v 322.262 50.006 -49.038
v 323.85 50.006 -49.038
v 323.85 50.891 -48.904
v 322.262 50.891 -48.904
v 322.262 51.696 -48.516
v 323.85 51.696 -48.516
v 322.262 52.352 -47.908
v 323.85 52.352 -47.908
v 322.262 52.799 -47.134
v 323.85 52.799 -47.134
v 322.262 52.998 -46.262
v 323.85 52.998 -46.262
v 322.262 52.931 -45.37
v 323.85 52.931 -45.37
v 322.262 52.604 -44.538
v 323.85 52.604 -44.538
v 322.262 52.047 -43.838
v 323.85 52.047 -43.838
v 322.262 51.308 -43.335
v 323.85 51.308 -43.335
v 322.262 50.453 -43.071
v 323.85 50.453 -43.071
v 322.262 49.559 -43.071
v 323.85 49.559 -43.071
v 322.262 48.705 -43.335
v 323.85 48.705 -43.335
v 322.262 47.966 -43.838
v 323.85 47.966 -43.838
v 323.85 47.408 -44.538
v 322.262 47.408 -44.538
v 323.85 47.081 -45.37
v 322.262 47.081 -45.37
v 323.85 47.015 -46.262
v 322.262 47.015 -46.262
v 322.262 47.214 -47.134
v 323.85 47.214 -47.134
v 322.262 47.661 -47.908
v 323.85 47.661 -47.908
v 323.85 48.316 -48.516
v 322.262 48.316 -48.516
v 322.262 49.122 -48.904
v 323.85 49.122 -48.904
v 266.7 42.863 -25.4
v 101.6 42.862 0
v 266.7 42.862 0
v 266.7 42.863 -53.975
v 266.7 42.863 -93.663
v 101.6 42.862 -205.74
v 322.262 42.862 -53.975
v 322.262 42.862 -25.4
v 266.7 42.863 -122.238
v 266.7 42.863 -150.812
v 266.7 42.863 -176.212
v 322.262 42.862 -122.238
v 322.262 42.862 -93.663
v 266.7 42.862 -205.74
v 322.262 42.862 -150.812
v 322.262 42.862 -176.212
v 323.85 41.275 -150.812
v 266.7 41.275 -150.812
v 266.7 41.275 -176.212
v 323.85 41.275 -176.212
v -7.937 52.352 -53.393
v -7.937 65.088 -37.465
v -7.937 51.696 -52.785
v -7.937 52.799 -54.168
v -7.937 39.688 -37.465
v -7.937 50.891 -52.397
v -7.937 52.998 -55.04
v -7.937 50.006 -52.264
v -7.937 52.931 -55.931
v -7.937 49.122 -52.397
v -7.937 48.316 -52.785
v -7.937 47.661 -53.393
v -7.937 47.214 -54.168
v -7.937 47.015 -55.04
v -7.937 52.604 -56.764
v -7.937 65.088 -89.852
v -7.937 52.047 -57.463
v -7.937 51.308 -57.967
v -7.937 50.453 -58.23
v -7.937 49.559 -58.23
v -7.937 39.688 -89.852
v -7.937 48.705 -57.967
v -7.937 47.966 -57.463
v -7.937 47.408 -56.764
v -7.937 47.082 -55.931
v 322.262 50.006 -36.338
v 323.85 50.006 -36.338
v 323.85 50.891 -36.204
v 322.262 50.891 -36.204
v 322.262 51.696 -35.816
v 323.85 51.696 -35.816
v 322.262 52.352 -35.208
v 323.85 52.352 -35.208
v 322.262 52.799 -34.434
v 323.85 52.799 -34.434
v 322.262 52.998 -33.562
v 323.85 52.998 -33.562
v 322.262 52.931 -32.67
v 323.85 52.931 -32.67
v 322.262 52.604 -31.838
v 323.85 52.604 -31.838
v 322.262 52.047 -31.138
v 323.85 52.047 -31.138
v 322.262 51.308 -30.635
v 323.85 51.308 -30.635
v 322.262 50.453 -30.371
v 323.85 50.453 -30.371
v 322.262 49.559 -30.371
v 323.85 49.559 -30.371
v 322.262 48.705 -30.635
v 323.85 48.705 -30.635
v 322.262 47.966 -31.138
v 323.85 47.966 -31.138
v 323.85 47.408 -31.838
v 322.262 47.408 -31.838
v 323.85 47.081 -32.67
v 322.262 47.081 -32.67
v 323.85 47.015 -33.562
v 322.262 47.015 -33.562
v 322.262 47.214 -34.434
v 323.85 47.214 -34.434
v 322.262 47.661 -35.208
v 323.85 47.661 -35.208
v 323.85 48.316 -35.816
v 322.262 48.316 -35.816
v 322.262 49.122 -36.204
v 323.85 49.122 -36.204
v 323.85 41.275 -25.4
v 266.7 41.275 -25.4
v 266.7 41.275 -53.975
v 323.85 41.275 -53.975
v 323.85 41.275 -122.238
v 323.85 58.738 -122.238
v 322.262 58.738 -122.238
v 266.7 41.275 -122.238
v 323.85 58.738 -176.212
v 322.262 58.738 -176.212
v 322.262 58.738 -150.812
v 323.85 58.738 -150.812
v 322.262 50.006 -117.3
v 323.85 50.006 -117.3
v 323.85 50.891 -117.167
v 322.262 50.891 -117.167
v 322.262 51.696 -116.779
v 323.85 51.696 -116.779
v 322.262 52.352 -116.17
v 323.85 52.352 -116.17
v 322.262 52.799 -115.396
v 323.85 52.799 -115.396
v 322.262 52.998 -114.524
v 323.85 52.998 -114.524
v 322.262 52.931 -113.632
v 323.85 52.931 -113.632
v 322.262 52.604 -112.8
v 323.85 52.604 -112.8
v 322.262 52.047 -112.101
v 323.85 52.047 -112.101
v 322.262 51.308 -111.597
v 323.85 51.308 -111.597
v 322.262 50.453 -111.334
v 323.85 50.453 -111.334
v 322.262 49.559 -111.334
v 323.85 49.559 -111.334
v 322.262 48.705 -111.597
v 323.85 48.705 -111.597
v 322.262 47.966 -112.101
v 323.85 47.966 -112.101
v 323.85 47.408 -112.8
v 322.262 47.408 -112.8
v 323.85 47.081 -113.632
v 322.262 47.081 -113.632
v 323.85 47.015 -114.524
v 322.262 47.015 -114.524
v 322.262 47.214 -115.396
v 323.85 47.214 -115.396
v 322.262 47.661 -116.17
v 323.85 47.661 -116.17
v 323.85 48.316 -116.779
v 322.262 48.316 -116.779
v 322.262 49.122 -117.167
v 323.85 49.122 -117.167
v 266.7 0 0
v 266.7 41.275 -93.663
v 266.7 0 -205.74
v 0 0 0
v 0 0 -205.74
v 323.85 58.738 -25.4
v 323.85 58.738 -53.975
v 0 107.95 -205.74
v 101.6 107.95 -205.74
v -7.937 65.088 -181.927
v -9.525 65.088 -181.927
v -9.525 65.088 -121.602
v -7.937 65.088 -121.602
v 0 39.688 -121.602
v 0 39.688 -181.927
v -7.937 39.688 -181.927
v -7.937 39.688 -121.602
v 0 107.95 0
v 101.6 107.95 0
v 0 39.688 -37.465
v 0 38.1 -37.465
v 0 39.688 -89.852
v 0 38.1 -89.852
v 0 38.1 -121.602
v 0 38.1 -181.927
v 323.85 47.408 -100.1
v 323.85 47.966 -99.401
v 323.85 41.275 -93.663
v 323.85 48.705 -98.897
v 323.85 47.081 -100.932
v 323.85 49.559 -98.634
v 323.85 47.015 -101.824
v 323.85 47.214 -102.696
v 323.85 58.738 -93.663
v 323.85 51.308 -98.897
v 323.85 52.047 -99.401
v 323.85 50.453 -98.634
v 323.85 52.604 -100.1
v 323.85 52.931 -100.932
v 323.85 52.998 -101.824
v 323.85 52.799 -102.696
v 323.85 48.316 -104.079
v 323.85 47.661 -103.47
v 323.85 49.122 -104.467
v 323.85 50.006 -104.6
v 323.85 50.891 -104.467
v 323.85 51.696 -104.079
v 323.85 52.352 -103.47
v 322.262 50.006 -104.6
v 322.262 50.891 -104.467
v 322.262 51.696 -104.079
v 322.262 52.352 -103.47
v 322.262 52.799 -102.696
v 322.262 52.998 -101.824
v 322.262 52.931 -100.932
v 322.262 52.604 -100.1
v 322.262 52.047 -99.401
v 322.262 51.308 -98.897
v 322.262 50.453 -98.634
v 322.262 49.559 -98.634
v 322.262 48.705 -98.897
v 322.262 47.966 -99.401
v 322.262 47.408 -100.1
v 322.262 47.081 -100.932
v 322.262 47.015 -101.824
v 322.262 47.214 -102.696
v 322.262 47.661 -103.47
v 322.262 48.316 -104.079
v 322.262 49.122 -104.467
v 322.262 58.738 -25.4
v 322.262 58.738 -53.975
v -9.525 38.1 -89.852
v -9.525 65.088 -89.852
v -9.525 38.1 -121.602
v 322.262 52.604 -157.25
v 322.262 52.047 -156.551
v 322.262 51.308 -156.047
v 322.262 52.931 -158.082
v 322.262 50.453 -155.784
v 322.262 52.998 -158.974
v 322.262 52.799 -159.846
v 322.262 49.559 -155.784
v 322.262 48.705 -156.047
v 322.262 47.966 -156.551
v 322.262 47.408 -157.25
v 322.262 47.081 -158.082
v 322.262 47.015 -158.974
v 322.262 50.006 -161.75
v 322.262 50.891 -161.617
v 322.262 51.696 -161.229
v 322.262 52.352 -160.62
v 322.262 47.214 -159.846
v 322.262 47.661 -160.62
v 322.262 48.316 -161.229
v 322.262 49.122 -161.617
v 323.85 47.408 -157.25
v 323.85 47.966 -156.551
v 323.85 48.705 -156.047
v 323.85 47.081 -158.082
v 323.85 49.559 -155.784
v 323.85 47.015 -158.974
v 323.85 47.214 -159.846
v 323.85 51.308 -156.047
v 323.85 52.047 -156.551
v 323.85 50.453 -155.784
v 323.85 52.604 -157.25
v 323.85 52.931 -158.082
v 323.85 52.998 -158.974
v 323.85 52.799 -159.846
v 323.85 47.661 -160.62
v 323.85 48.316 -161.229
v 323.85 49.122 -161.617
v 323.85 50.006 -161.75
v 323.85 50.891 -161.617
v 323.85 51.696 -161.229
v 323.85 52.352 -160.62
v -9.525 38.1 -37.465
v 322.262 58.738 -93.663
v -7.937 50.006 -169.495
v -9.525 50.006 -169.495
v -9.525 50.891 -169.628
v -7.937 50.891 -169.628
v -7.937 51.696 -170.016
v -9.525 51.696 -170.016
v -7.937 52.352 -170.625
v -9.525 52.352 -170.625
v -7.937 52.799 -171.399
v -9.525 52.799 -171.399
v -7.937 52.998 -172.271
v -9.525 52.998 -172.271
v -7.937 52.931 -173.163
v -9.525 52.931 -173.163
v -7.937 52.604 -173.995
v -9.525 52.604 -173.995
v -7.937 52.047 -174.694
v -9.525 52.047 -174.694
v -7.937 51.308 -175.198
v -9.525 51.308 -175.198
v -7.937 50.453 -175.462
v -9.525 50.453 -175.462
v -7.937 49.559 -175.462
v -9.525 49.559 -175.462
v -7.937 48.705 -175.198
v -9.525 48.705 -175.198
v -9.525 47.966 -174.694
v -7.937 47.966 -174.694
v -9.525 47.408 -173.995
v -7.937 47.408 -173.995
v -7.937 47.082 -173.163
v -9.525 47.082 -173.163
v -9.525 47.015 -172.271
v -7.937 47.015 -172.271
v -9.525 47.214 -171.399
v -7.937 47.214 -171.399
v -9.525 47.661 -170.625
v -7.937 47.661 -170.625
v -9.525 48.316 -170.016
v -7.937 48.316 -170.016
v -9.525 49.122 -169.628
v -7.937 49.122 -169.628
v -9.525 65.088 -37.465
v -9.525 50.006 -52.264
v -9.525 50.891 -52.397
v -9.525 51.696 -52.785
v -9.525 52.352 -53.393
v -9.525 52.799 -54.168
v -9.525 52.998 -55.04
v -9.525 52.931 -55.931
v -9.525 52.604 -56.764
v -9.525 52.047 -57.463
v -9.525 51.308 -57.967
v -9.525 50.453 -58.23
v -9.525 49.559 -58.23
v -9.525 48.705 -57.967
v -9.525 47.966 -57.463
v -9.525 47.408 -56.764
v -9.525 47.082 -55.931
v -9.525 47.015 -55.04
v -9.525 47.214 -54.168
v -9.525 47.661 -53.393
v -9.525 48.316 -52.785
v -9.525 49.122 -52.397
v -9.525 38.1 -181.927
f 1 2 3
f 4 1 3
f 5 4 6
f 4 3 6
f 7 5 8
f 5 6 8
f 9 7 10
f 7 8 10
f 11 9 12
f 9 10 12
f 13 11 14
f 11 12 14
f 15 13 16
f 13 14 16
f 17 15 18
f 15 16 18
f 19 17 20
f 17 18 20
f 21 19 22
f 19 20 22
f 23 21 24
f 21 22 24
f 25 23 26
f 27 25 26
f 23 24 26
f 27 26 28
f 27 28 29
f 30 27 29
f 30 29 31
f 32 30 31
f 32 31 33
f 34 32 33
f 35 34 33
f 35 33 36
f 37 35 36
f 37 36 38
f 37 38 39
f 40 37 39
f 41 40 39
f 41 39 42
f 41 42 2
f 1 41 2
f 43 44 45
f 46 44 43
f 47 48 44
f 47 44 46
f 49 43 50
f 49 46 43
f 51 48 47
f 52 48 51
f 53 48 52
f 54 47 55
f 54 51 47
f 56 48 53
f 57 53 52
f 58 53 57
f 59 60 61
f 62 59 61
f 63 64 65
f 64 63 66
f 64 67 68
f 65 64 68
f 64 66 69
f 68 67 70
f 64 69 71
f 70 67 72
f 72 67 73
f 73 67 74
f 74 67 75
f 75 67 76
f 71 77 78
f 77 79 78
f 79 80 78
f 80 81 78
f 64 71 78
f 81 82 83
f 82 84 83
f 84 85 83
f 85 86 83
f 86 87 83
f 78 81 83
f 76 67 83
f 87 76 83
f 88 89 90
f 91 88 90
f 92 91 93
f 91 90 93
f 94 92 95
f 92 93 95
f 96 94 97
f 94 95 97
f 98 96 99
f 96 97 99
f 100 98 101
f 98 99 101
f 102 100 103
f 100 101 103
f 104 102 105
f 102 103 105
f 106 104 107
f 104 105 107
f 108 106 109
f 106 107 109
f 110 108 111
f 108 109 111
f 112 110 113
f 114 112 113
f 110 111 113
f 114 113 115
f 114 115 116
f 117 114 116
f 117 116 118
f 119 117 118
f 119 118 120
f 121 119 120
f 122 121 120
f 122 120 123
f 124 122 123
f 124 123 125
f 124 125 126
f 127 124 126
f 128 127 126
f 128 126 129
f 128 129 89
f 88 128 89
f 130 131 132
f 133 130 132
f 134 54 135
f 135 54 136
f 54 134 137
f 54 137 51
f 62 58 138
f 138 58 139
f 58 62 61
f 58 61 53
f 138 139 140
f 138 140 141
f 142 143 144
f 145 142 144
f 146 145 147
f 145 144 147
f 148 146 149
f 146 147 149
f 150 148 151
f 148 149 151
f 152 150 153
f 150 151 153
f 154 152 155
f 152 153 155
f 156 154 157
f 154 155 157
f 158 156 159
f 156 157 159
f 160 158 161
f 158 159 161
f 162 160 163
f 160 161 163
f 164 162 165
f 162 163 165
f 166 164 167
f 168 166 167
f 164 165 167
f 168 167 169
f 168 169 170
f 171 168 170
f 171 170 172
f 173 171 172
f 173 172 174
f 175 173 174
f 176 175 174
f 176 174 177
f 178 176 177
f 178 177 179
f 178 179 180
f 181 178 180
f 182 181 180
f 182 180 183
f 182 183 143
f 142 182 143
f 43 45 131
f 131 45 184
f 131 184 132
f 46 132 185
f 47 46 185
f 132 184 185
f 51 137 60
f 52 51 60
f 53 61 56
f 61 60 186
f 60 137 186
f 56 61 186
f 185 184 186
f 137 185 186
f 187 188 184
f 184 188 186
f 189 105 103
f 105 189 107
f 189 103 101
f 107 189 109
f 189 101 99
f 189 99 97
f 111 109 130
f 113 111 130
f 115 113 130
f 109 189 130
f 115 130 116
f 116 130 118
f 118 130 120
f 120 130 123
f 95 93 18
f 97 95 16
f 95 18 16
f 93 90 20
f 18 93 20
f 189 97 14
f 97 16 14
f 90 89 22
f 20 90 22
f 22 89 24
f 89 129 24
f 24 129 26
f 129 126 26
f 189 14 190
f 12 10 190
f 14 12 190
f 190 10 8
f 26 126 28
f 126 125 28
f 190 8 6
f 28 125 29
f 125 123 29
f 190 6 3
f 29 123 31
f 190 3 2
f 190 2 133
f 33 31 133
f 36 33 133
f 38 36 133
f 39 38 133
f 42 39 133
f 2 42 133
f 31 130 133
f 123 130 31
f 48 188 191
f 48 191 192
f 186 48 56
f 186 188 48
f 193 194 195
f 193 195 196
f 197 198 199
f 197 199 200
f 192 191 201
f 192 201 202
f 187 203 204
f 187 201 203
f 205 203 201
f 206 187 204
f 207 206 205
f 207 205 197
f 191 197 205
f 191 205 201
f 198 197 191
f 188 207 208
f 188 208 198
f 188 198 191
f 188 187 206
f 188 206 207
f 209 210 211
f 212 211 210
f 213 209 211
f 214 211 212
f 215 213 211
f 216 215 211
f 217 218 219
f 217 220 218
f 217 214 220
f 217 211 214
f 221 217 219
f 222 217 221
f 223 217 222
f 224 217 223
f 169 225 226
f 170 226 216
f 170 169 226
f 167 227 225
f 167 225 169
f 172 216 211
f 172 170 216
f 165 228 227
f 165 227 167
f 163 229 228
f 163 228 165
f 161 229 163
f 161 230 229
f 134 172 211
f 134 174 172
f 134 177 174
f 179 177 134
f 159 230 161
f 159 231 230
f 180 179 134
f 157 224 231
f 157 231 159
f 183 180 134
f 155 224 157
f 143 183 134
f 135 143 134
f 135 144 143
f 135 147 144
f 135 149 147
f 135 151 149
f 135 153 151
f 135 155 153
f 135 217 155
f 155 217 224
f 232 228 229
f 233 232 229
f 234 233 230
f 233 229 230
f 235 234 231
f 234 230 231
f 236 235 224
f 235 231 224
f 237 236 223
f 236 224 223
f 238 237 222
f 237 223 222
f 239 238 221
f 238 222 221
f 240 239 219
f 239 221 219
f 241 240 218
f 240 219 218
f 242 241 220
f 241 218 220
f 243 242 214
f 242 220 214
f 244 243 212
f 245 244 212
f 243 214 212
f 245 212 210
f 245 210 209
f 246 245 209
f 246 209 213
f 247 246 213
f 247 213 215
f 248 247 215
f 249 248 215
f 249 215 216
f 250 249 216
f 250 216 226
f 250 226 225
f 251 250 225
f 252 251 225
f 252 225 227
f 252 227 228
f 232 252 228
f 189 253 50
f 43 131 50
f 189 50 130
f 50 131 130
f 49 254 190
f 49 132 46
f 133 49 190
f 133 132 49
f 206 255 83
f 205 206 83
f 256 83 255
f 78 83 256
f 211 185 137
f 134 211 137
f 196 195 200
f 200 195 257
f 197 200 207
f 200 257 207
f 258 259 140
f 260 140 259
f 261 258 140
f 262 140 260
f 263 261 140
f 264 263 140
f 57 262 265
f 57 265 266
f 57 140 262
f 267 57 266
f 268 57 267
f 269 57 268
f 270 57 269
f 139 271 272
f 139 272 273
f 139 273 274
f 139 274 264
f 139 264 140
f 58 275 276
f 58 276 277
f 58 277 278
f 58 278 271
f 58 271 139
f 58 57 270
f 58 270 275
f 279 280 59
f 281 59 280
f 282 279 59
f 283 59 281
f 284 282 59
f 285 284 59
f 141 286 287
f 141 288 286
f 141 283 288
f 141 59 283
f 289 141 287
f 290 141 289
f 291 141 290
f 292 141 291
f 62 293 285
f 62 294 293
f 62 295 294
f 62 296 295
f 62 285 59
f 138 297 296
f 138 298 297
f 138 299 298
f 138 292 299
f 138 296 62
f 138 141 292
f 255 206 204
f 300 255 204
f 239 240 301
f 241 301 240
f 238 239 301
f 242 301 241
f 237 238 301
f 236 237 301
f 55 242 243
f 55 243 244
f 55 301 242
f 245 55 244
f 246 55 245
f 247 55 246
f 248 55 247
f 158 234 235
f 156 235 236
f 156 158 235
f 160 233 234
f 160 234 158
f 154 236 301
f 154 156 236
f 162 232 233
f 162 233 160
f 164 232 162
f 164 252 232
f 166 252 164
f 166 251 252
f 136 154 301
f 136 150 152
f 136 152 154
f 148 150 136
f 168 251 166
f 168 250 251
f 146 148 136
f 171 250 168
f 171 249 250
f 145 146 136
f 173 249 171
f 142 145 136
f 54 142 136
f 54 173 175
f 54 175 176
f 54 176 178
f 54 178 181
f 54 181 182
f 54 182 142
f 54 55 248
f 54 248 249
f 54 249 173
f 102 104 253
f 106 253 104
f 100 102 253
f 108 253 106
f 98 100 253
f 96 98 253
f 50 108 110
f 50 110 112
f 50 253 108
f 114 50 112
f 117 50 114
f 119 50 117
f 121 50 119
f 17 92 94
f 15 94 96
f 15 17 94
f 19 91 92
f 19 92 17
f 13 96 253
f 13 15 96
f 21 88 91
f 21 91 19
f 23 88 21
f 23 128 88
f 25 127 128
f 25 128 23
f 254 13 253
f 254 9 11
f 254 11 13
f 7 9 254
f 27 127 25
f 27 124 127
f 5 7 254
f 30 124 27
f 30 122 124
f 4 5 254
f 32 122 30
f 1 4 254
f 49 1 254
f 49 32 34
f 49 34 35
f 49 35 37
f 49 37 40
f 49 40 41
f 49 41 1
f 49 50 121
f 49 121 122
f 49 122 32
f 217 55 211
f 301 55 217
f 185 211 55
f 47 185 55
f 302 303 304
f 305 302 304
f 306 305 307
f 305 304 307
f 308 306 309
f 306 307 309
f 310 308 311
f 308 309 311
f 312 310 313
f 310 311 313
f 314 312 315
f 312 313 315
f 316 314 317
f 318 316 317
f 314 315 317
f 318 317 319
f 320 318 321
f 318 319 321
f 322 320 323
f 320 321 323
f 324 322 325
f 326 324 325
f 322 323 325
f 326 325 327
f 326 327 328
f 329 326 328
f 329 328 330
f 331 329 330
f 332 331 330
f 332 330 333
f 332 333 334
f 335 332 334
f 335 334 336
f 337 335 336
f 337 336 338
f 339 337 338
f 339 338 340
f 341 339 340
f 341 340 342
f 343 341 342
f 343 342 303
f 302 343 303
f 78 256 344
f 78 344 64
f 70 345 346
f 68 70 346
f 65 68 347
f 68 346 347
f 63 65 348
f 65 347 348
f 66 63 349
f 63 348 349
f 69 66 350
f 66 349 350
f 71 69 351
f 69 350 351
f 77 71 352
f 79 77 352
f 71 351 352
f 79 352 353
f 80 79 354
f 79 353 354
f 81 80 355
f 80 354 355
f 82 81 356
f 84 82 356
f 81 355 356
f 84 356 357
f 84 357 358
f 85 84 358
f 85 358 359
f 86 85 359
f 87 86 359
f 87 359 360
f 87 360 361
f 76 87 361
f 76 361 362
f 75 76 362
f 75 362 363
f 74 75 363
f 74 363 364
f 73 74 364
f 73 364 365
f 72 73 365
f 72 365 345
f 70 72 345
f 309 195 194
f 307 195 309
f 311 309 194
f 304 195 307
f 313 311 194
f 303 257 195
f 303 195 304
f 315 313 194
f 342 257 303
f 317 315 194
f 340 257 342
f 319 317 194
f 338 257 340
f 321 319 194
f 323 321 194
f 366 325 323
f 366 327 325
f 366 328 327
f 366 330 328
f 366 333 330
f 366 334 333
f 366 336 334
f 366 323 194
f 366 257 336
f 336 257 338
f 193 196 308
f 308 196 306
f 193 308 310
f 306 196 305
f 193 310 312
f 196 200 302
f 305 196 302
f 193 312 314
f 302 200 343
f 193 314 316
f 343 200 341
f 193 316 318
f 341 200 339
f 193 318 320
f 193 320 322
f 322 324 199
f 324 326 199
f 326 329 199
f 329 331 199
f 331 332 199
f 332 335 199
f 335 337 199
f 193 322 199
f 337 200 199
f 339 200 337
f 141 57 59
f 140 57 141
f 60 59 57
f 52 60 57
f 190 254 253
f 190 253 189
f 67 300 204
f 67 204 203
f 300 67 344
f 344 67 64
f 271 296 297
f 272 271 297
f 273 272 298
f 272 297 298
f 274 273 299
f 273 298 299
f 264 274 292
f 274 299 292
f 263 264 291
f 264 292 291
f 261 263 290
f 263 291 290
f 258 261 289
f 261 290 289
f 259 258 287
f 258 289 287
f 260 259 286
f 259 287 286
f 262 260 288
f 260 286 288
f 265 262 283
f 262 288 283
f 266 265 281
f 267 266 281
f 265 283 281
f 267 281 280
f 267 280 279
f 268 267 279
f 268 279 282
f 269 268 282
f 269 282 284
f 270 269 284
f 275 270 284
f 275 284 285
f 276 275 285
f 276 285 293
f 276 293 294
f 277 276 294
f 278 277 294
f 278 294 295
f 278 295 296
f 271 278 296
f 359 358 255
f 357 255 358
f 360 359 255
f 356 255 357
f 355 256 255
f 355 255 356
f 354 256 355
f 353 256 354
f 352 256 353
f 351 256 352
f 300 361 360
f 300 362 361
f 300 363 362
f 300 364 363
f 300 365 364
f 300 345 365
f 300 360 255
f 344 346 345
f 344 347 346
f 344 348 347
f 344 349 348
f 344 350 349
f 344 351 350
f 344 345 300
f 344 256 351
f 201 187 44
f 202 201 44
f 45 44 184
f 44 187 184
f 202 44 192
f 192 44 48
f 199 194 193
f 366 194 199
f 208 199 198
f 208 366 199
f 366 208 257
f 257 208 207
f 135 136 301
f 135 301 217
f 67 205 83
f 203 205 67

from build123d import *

# Parameters (mm, degrees)
SKETCH1_W               = 101.6
SKETCH1_H               = 205.74
BATTERY_SIDE_DEPTH      = 107.95
SKETCH6_W               = 60.325
SKETCH6_H               = 1.5875
SKETCH6_W_2             = 52.3875
BATTERY_TAB_BASES_DEPTH = 9.525
SKETCH7_W               = 1.5875
SKETCH7_H               = 60.325
SKETCH7_H_2             = 52.3875
BATTERY_TABS_DEPTH      = 25.4
BATTERY_TAB_HOLES_REACH = 113.125
SKETCH8_R               = 3
SKETCH2_W               = 165.1
SKETCH2_H               = 205.74
MOTOR_SIDE_DEPTH        = 42.8625
SKETCH3_W               = 28.575
SKETCH3_H               = 1.5875
SKETCH3_W_2             = 25.4
MOTOR_TAB_BASES_DEPTH   = 57.15
SKETCH4_W               = 1.5875
SKETCH4_H               = 28.575
SKETCH4_H_2             = 25.4
MOTOR_TABS_DEPTH        = 15.875
MOTOR_TAB_HOLES_REACH   = 335.375
SKETCH5_R               = 3


with BuildPart() as part:
    # Sketch1 → Battery Side (new body)
    with BuildSketch(Plane(origin=(0, 0, 0), x_dir=(1, 0, 0), z_dir=(0, 1, 0))):
        with Locations((50.8, 102.87)):
            Rectangle(SKETCH1_W, SKETCH1_H)
    extrude(amount=BATTERY_SIDE_DEPTH)

    # Sketch6 → Battery Tab Bases (add)
    with BuildSketch(Plane.ZY):
        with Locations((-151.765, 38.89375)):
            Rectangle(SKETCH6_W, SKETCH6_H)
        with Locations((-63.65875, 38.89375)):
            Rectangle(SKETCH6_W_2, SKETCH6_H)
    extrude(amount=BATTERY_TAB_BASES_DEPTH)

    # Sketch7 → Battery Tabs (add)
    with BuildSketch(Plane(origin=(0, 39.6875, 0), x_dir=(1, 0, 0), z_dir=(0, 1, 0))):
        with Locations((-8.73125, 151.765)):
            Rectangle(SKETCH7_W, SKETCH7_H)
        with Locations((-8.73125, 63.65875)):
            Rectangle(SKETCH7_W, SKETCH7_H_2)
    extrude(amount=BATTERY_TABS_DEPTH)

    # Sketch8 → Battery Tab Holes (cut, up to next)
    with BuildSketch(Plane.ZY.offset(9.525), mode=Mode.PRIVATE) as battery_tab_holes_sk1:
        with Locations((-172.495098328, 50.0063)):
            Circle(SKETCH8_R)
    battery_tab_holes_tool1 = extrude(battery_tab_holes_sk1.sketch, amount=-BATTERY_TAB_HOLES_REACH, mode=Mode.PRIVATE) & part.part
    add(battery_tab_holes_tool1.solids().sort_by_distance((-9.525, 50.0063, -172.495098))[0], mode=Mode.SUBTRACT)
    # Sketch8 → Battery Tab Holes (cut, up to next)
    with BuildSketch(Plane.ZY.offset(9.525), mode=Mode.PRIVATE) as battery_tab_holes_sk2:
        with Locations((-55.26378475, 50.0063)):
            Circle(SKETCH8_R)
    battery_tab_holes_tool2 = extrude(battery_tab_holes_sk2.sketch, amount=-BATTERY_TAB_HOLES_REACH, mode=Mode.PRIVATE) & part.part
    add(battery_tab_holes_tool2.solids().sort_by_distance((-9.525, 50.0063, -55.263785))[0], mode=Mode.SUBTRACT)

    # Sketch2 → Motor Side (add)
    with BuildSketch(Plane(origin=(0, 0, 0), x_dir=(1, 0, 0), z_dir=(0, 1, 0))):
        with Locations((184.15, 102.87)):
            Rectangle(SKETCH2_W, SKETCH2_H)
    extrude(amount=MOTOR_SIDE_DEPTH)

    # Sketch3 → Motor Tab Bases (add)
    with BuildSketch(Plane(origin=(266.7, 0, 0), x_dir=(0, 0, -1), z_dir=(1, 0, 0))):
        with Locations((39.6875, 42.06875)):
            Rectangle(SKETCH3_W, SKETCH3_H)
        with Locations((107.95, 42.06875)):
            Rectangle(SKETCH3_W, SKETCH3_H)
        with Locations((163.5125, 42.06875)):
            Rectangle(SKETCH3_W_2, SKETCH3_H)
    extrude(amount=MOTOR_TAB_BASES_DEPTH)

    # Sketch4 → Motor Tabs (add)
    with BuildSketch(Plane(origin=(0, 42.8625, 0), x_dir=(1, 0, 0), z_dir=(0, 1, 0))):
        with Locations((323.05625, 39.6875)):
            Rectangle(SKETCH4_W, SKETCH4_H)
        with Locations((323.05625, 107.95)):
            Rectangle(SKETCH4_W, SKETCH4_H)
        with Locations((323.05625, 163.5125)):
            Rectangle(SKETCH4_W, SKETCH4_H_2)
    extrude(amount=MOTOR_TABS_DEPTH)

    # Sketch5 → Motor Tab Holes (cut, up to next)
    with BuildSketch(Plane(origin=(323.85, 0, 0), x_dir=(0, 0, -1), z_dir=(1, 0, 0)), mode=Mode.PRIVATE) as motor_tab_holes_sk1:
        with Locations((33.3375, 50.00625)):
            Circle(SKETCH5_R)
    motor_tab_holes_tool1 = extrude(motor_tab_holes_sk1.sketch, amount=-MOTOR_TAB_HOLES_REACH, mode=Mode.PRIVATE) & part.part
    add(motor_tab_holes_tool1.solids().sort_by_distance((323.85, 50.00625, -33.3375))[0], mode=Mode.SUBTRACT)
    # Sketch5 → Motor Tab Holes (cut, up to next)
    with BuildSketch(Plane(origin=(323.85, 0, 0), x_dir=(0, 0, -1), z_dir=(1, 0, 0)), mode=Mode.PRIVATE) as motor_tab_holes_sk2:
        with Locations((46.0375, 50.00625)):
            Circle(SKETCH5_R)
    motor_tab_holes_tool2 = extrude(motor_tab_holes_sk2.sketch, amount=-MOTOR_TAB_HOLES_REACH, mode=Mode.PRIVATE) & part.part
    add(motor_tab_holes_tool2.solids().sort_by_distance((323.85, 50.00625, -46.0375))[0], mode=Mode.SUBTRACT)
    # Sketch5 → Motor Tab Holes (cut, up to next)
    with BuildSketch(Plane(origin=(323.85, 0, 0), x_dir=(0, 0, -1), z_dir=(1, 0, 0)), mode=Mode.PRIVATE) as motor_tab_holes_sk3:
        with Locations((101.6, 50.00625)):
            Circle(SKETCH5_R)
    motor_tab_holes_tool3 = extrude(motor_tab_holes_sk3.sketch, amount=-MOTOR_TAB_HOLES_REACH, mode=Mode.PRIVATE) & part.part
    add(motor_tab_holes_tool3.solids().sort_by_distance((323.85, 50.00625, -101.6))[0], mode=Mode.SUBTRACT)
    # Sketch5 → Motor Tab Holes (cut, up to next)
    with BuildSketch(Plane(origin=(323.85, 0, 0), x_dir=(0, 0, -1), z_dir=(1, 0, 0)), mode=Mode.PRIVATE) as motor_tab_holes_sk4:
        with Locations((114.3, 50.00625)):
            Circle(SKETCH5_R)
    motor_tab_holes_tool4 = extrude(motor_tab_holes_sk4.sketch, amount=-MOTOR_TAB_HOLES_REACH, mode=Mode.PRIVATE) & part.part
    add(motor_tab_holes_tool4.solids().sort_by_distance((323.85, 50.00625, -114.3))[0], mode=Mode.SUBTRACT)
    # Sketch5 → Motor Tab Holes (cut, up to next)
    with BuildSketch(Plane(origin=(323.85, 0, 0), x_dir=(0, 0, -1), z_dir=(1, 0, 0)), mode=Mode.PRIVATE) as motor_tab_holes_sk5:
        with Locations((158.75, 50.00625)):
            Circle(SKETCH5_R)
    motor_tab_holes_tool5 = extrude(motor_tab_holes_sk5.sketch, amount=-MOTOR_TAB_HOLES_REACH, mode=Mode.PRIVATE) & part.part
    add(motor_tab_holes_tool5.solids().sort_by_distance((323.85, 50.00625, -158.75))[0], mode=Mode.SUBTRACT)


solid = part.part
